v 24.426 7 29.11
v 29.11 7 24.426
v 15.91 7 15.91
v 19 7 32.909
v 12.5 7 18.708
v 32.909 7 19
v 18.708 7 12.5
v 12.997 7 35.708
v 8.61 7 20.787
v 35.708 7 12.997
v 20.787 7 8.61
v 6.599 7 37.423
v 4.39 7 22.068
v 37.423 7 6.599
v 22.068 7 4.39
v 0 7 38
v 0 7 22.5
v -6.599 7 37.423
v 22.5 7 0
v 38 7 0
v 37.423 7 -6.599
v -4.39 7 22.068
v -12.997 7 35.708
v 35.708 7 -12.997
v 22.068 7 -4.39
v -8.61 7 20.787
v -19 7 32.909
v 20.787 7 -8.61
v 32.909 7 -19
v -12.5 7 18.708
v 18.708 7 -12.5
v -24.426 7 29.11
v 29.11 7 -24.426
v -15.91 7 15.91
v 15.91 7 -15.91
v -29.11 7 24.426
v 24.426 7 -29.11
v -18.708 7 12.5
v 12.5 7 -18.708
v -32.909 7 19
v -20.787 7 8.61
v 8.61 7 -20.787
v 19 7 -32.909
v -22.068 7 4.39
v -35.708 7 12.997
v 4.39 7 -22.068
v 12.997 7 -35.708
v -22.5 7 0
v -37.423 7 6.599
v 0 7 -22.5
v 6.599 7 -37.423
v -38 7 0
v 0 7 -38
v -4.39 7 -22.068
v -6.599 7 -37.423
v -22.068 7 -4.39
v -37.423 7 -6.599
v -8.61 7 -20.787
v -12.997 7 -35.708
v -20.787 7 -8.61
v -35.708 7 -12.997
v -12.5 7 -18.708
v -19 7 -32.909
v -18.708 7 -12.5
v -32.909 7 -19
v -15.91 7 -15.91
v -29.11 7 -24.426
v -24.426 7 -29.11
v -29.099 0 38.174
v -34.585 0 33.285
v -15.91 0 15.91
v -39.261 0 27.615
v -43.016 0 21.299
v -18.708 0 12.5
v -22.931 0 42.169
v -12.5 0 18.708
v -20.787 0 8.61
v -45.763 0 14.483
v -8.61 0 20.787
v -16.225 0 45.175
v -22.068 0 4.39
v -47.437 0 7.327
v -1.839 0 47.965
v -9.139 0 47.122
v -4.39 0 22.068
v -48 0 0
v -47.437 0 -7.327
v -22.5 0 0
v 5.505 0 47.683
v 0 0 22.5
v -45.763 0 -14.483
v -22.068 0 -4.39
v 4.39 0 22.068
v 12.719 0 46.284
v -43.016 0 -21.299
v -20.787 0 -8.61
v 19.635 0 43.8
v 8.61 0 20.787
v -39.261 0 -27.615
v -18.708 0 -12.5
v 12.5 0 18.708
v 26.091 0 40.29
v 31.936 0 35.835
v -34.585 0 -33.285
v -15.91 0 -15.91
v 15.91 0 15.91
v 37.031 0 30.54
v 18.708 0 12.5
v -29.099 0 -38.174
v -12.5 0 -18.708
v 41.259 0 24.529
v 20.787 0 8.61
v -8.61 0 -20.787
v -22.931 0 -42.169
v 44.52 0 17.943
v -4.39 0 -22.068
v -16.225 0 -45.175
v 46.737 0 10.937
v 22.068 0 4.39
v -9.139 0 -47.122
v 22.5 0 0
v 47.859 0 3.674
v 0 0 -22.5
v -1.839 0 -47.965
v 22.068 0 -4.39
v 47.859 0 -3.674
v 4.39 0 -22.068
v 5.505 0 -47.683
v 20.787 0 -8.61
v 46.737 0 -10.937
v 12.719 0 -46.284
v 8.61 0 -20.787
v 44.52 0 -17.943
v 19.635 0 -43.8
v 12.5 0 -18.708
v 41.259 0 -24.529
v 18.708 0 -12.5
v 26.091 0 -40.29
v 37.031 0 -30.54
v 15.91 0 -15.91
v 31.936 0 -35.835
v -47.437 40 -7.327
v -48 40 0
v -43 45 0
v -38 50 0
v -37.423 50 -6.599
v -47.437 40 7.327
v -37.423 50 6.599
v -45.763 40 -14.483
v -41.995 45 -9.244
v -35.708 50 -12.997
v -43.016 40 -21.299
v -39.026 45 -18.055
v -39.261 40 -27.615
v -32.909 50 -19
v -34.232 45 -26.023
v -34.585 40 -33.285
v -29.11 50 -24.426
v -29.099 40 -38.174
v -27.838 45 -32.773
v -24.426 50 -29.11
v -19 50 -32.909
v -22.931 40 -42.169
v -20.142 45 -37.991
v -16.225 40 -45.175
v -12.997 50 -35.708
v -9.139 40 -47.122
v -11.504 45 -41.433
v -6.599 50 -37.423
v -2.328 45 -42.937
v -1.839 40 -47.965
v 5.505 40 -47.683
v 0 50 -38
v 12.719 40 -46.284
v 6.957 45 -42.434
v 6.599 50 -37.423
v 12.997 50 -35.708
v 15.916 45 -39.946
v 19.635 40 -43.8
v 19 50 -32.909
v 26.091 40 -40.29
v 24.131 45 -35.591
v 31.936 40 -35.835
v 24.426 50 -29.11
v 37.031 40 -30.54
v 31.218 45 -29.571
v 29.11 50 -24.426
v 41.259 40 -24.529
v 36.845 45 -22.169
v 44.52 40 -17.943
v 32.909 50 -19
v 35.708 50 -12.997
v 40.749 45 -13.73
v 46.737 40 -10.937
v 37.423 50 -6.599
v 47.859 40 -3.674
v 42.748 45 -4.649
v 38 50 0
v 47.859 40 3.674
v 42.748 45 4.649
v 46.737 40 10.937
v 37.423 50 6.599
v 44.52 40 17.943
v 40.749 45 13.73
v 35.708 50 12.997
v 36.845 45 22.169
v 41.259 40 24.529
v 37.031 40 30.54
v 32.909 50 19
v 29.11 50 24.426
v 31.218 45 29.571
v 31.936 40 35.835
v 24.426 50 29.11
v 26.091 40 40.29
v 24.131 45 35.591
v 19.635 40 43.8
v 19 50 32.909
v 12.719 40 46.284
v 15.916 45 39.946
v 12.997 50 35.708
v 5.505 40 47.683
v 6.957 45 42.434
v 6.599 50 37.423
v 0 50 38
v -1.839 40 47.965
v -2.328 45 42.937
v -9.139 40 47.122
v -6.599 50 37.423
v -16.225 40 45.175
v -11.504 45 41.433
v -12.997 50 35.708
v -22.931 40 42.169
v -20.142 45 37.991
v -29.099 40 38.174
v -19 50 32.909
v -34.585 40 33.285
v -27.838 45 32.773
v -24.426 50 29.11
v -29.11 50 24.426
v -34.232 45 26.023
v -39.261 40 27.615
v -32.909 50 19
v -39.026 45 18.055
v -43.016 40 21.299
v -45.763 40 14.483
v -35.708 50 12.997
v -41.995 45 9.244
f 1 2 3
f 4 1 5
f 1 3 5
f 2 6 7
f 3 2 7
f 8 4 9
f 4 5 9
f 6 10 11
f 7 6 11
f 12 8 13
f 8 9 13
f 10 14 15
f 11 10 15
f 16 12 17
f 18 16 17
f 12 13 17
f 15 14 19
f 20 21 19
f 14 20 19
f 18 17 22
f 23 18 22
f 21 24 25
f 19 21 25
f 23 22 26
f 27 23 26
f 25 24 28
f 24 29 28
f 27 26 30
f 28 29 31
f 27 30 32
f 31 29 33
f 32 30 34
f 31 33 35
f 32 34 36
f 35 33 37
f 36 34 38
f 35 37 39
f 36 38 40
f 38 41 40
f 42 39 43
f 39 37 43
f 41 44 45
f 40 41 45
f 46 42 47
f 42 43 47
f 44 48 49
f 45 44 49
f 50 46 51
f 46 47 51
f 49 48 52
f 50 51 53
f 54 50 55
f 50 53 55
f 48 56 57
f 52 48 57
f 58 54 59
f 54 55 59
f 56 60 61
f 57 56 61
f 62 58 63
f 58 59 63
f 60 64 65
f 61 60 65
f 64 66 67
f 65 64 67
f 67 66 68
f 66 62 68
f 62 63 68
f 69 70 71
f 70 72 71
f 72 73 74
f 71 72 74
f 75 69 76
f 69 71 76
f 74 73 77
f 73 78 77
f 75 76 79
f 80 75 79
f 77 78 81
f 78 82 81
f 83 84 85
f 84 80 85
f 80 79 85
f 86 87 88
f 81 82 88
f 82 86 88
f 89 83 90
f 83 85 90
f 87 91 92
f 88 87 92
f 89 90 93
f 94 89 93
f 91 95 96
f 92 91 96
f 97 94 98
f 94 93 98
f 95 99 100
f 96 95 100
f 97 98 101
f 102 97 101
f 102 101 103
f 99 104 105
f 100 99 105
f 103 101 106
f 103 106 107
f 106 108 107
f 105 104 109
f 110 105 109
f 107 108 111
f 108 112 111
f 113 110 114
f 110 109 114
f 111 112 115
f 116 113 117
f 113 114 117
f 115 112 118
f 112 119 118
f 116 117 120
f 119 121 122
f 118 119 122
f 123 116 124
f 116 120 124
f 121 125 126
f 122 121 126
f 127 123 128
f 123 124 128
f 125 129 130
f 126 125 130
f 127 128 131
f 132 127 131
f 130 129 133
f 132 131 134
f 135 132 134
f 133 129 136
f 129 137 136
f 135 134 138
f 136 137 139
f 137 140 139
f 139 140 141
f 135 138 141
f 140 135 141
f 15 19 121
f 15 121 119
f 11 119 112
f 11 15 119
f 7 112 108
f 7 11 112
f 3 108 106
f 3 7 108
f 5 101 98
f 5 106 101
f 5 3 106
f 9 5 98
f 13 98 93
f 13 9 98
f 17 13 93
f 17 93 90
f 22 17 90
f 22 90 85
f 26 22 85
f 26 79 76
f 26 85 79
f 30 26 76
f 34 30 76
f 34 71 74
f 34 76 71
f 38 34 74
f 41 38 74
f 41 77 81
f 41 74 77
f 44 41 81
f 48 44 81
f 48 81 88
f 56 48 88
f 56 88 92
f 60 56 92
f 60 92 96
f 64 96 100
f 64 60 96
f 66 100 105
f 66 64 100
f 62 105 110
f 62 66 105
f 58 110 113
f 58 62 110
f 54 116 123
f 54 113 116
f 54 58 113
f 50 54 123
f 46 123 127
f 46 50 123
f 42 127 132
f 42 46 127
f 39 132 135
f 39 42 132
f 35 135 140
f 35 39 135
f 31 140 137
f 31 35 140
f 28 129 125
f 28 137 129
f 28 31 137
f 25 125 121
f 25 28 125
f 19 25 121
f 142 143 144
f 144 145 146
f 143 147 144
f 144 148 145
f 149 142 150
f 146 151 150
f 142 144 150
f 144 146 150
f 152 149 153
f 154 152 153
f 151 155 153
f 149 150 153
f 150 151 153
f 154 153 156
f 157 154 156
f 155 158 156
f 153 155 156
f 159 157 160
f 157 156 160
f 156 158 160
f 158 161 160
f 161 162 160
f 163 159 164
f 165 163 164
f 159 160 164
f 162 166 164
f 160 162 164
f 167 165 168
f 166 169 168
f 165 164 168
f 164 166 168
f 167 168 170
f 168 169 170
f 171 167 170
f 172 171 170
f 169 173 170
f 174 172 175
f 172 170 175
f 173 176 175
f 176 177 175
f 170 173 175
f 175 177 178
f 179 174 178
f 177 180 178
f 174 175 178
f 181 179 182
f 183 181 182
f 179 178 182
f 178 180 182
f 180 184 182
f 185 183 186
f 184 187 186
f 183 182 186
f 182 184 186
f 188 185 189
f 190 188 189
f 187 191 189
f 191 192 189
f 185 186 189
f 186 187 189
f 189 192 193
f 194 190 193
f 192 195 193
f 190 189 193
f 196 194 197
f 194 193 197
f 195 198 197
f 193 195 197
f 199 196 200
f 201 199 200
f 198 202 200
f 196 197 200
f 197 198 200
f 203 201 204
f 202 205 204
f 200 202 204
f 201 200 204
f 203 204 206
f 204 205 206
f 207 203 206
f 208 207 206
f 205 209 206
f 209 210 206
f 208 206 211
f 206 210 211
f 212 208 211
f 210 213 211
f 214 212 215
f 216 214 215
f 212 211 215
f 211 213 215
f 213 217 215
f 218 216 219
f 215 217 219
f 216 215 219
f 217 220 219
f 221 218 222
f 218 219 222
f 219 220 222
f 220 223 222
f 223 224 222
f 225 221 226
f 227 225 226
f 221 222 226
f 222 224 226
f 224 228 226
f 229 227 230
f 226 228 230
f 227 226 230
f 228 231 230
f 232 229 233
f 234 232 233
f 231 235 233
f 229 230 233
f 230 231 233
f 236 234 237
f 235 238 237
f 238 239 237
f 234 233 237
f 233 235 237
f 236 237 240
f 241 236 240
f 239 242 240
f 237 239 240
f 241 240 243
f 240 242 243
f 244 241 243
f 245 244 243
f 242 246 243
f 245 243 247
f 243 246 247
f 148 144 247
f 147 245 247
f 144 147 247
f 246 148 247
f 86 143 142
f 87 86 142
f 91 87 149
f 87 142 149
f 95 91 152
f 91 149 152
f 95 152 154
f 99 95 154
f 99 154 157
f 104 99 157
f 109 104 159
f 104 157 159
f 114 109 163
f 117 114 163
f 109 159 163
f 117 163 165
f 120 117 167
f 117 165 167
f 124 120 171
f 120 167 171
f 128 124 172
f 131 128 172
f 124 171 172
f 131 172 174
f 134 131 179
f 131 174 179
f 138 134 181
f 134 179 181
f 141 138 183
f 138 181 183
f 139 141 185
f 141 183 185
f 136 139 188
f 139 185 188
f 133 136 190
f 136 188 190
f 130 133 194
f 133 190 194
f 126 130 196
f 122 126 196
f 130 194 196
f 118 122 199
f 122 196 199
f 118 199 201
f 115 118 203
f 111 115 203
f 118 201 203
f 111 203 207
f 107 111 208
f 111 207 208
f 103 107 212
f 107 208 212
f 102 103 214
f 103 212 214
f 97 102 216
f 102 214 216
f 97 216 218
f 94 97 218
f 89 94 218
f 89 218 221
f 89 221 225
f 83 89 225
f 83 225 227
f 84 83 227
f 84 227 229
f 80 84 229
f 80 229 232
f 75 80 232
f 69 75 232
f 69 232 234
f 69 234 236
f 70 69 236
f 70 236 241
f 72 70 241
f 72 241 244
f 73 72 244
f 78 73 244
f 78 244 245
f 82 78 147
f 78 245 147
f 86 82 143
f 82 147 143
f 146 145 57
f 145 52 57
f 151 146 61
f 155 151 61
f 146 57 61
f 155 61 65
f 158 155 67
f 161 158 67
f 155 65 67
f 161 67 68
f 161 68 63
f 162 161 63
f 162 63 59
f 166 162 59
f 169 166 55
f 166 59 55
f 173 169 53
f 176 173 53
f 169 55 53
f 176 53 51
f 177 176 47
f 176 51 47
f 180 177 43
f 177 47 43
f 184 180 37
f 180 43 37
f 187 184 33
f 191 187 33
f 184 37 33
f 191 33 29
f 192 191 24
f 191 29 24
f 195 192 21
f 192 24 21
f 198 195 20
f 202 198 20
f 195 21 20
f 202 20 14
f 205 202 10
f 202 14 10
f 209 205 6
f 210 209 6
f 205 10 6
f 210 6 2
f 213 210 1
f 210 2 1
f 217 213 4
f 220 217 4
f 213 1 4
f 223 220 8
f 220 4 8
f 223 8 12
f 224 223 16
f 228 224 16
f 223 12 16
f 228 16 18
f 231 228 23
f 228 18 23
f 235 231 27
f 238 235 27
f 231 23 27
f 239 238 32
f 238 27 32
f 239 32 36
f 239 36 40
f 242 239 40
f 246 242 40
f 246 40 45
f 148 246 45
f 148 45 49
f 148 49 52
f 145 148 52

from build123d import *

# Parameters (mm, degrees)
CUT_EXTRUDE1_DEPTH      = 85.308955633
CUT_EXTRUDE1_DEPTH_BACK = 85.308955633
SKETCH2_R               = 22.5
CHAMFER1_SIZE           = 10


with BuildPart() as part:
    # Sketch1 → Revolve2 (revolve)
    with BuildSketch(Plane.XY, mode=Mode.PRIVATE) as revolve2_sk:
        Polygon((0, 0), (48, 0), (48, 50), (38, 50), (38, 7), (0, 7), align=None)
    revolve(revolve2_sk.sketch.rotate(Axis((0, 7, 0), (0, -1, 0)), 180), axis=Axis((0, 7, 0), (0, -1, 0)))

    # Sketch2 → Cut-Extrude1 (cut, two sides: drawn at the far end of the back side and taken through both)
    with BuildSketch(Plane.XZ.offset(-CUT_EXTRUDE1_DEPTH_BACK)):
        Circle(SKETCH2_R)
    extrude(amount=CUT_EXTRUDE1_DEPTH + CUT_EXTRUDE1_DEPTH_BACK, mode=Mode.SUBTRACT)

    # Chamfer1
    chamfer1_edges = [part.edges().sort_by_distance(p)[0] for p in [
        (48, 50, 0),
    ]]
    chamfer(chamfer1_edges, length=CHAMFER1_SIZE - 0.0001)  # a hair under: the kernel refuses the full size


solid = part.part
